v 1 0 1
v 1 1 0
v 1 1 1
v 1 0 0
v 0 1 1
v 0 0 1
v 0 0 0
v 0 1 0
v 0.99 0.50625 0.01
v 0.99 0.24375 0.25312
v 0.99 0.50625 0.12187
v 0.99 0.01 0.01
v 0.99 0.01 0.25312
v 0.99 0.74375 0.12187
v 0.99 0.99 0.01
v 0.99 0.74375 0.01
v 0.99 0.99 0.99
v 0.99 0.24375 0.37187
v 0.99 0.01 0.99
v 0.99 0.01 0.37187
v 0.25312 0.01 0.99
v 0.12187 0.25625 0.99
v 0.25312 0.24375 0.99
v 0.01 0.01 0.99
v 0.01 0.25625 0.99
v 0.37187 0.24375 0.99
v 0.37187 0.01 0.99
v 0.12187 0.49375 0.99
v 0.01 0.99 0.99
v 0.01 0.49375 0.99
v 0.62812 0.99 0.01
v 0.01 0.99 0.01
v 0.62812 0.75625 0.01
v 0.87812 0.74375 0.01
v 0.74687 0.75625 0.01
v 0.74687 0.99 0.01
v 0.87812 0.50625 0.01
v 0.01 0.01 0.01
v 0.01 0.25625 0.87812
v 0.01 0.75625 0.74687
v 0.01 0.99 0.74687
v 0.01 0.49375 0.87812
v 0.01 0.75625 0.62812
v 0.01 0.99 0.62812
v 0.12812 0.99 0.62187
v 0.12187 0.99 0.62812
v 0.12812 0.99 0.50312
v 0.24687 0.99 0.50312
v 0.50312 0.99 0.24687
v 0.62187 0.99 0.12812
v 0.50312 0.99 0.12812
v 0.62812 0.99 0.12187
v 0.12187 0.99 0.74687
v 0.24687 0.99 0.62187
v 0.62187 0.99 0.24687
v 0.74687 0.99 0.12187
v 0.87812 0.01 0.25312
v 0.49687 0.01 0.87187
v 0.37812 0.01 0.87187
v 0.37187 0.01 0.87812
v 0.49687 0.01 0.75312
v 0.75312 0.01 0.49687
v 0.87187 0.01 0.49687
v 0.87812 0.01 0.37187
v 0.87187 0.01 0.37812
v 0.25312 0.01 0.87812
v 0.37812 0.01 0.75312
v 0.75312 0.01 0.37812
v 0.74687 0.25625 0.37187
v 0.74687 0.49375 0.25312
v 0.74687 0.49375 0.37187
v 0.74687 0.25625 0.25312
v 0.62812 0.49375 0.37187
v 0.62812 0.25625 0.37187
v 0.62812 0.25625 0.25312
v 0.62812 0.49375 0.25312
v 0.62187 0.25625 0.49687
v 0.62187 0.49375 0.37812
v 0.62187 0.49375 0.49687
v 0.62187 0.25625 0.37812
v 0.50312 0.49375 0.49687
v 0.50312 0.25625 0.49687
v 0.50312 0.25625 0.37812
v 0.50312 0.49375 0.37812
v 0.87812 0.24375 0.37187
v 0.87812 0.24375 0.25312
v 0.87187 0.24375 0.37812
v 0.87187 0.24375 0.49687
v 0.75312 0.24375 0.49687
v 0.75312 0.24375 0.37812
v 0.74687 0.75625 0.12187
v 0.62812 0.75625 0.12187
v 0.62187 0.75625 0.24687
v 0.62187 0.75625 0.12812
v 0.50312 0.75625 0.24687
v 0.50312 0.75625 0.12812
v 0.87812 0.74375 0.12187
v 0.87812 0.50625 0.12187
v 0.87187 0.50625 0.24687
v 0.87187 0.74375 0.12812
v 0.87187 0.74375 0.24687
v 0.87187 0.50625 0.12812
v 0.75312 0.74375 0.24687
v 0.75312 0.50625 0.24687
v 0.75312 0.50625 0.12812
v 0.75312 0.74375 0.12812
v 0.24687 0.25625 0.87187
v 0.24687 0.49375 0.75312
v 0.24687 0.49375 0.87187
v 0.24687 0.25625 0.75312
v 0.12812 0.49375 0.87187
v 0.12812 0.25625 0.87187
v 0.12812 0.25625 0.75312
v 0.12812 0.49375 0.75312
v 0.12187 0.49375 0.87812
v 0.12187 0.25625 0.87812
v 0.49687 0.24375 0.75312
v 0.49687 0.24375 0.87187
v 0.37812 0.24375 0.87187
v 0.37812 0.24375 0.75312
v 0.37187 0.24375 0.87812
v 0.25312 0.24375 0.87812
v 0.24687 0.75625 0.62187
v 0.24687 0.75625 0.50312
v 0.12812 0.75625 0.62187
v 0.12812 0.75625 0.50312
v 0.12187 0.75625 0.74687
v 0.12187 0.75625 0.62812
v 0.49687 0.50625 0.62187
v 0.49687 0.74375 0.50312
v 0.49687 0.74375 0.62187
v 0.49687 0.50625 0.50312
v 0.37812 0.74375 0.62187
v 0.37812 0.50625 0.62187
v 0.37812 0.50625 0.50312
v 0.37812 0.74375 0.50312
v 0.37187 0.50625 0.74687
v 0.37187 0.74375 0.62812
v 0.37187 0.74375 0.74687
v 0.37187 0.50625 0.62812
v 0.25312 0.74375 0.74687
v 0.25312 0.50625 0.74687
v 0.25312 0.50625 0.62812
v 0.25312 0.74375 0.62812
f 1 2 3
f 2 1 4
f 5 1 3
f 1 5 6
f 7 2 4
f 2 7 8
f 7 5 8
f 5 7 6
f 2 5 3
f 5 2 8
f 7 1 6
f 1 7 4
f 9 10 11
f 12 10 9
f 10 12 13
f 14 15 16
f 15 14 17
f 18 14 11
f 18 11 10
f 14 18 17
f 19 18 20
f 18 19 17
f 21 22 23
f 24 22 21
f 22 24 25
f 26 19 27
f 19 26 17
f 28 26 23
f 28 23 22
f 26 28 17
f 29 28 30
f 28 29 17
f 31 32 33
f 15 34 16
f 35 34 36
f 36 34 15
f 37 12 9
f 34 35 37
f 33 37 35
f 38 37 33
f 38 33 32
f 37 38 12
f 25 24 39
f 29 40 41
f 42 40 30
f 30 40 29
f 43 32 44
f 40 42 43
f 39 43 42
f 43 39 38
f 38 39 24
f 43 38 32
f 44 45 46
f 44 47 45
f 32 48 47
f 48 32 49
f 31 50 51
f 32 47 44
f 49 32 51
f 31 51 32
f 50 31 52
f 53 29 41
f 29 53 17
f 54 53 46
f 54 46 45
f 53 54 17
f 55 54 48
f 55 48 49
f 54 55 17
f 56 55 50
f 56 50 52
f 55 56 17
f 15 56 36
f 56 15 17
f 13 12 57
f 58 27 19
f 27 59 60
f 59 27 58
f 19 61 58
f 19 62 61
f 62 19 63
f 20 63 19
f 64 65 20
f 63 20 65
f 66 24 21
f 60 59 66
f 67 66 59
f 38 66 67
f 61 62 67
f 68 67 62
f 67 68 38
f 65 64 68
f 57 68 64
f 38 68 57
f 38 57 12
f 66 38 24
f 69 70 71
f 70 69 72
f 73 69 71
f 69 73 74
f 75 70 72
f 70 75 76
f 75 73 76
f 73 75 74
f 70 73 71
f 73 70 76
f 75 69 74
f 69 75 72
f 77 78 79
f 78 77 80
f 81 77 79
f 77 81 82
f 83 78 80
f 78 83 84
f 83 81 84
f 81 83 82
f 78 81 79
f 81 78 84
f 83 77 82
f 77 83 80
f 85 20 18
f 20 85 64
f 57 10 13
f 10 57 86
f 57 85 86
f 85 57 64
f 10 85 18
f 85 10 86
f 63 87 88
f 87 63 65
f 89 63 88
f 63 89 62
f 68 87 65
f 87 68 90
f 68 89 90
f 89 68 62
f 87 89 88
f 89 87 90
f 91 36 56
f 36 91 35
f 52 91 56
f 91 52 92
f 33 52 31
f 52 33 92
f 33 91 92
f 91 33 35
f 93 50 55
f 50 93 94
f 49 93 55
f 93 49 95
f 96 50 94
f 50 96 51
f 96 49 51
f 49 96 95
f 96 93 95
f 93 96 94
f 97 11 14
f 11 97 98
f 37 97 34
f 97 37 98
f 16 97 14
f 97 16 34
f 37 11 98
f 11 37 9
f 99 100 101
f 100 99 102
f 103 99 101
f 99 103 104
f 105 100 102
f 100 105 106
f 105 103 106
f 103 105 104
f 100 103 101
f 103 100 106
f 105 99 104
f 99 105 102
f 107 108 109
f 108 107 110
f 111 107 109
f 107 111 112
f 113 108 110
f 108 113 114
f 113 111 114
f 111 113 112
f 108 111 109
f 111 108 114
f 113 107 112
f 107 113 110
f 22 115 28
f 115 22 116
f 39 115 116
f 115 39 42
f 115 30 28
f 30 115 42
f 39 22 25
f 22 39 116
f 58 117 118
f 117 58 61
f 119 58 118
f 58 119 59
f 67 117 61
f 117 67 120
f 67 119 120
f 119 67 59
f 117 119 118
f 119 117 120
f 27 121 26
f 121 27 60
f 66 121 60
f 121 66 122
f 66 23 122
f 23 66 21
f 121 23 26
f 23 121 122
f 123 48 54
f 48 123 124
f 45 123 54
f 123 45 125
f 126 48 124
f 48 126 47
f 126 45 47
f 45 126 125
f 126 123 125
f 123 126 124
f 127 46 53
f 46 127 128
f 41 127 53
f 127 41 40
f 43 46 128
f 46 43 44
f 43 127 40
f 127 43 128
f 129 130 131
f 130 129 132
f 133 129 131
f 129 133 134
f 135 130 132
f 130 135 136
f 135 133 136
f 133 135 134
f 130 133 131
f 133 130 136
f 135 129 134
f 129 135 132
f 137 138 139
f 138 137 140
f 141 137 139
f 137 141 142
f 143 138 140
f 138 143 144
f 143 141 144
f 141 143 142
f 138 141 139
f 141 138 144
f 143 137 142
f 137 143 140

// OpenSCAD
translate([0.6875, 0.375, 0.3125]) color([0.7028074551613297, 0.5363166610120098, 0.09920532808894766]) cube([0.11875, 0.2375, 0.11875], center=true);
translate([0.5625, 0.375, 0.4375]) color([0.8914949025870249, 0.2026632104621977, 0.476760961916463]) cube([0.11875, 0.2375, 0.11875], center=true);
translate([0.9375, 0.125, 0.3125]) color([0.2023330620084881, 0.5768126026560325, 0.26703322197527013]) cube([0.11875, 0.2375, 0.11875], center=true);
translate([0.8125, 0.125, 0.4375]) color([0.8140255768657159, 0.8795258103140552, 0.14309790924387933]) cube([0.11875, 0.2375, 0.11875], center=true);
translate([0.6875, 0.875, 0.0625]) color([0.12230918821133374, 0.2257550246483545, 0.40521618792419933]) cube([0.11875, 0.2375, 0.11875], center=true);
translate([0.5625, 0.875, 0.1875]) color([0.12450798137059194, 0.8321307996019772, 0.6891055894020358]) cube([0.11875, 0.2375, 0.11875], center=true);
translate([0.9375, 0.625, 0.0625]) color([0.25887641591536703, 0.8170517306697254, 0.3404228694787186]) cube([0.11875, 0.2375, 0.11875], center=true);
translate([0.8125, 0.625, 0.1875]) color([0.37641908972584326, 0.2501347221853002, 0.5724006082894749]) cube([0.11875, 0.2375, 0.11875], center=true);
translate([0.1875, 0.375, 0.8125]) color([0.5640805054467947, 0.7364556805940918, 0.1435147504690819]) cube([0.11875, 0.2375, 0.11875], center=true);
translate([0.0625, 0.375, 0.9375]) color([0.7437338583278683, 0.6846849021679925, 0.7817676317022599]) cube([0.11875, 0.2375, 0.11875], center=true);
translate([0.4375, 0.125, 0.8125]) color([0.17267000101168717, 0.9047731518712065, 0.3202427611572526]) cube([0.11875, 0.2375, 0.11875], center=true);
translate([0.3125, 0.125, 0.9375]) color([0.14362805385316524, 0.21297983928778952, 0.3504588771078433]) cube([0.11875, 0.2375, 0.11875], center=true);
translate([0.1875, 0.875, 0.5625]) color([0.08716821567688682, 0.28565467265463806, 0.19120697621584404]) cube([0.11875, 0.2375, 0.11875], center=true);
translate([0.0625, 0.875, 0.6875]) color([0.1421191595593938, 0.5999304628098355, 0.9358457377055879]) cube([0.11875, 0.2375, 0.11875], center=true);
translate([0.4375, 0.625, 0.5625]) color([0.3438279940734408, 0.583174483324332, 0.851290649928372]) cube([0.11875, 0.2375, 0.11875], center=true);
translate([0.3125, 0.625, 0.6875]) color([0.6108142427476372, 0.11143535032622232, 0.27248049460031243]) cube([0.11875, 0.2375, 0.11875], center=true);
color([0.3,0.3,0.3,0.3]) difference() { cube([1,1,1]); translate([0.01,0.01,0.01]) cube([0.98,0.98,0.98]); }
